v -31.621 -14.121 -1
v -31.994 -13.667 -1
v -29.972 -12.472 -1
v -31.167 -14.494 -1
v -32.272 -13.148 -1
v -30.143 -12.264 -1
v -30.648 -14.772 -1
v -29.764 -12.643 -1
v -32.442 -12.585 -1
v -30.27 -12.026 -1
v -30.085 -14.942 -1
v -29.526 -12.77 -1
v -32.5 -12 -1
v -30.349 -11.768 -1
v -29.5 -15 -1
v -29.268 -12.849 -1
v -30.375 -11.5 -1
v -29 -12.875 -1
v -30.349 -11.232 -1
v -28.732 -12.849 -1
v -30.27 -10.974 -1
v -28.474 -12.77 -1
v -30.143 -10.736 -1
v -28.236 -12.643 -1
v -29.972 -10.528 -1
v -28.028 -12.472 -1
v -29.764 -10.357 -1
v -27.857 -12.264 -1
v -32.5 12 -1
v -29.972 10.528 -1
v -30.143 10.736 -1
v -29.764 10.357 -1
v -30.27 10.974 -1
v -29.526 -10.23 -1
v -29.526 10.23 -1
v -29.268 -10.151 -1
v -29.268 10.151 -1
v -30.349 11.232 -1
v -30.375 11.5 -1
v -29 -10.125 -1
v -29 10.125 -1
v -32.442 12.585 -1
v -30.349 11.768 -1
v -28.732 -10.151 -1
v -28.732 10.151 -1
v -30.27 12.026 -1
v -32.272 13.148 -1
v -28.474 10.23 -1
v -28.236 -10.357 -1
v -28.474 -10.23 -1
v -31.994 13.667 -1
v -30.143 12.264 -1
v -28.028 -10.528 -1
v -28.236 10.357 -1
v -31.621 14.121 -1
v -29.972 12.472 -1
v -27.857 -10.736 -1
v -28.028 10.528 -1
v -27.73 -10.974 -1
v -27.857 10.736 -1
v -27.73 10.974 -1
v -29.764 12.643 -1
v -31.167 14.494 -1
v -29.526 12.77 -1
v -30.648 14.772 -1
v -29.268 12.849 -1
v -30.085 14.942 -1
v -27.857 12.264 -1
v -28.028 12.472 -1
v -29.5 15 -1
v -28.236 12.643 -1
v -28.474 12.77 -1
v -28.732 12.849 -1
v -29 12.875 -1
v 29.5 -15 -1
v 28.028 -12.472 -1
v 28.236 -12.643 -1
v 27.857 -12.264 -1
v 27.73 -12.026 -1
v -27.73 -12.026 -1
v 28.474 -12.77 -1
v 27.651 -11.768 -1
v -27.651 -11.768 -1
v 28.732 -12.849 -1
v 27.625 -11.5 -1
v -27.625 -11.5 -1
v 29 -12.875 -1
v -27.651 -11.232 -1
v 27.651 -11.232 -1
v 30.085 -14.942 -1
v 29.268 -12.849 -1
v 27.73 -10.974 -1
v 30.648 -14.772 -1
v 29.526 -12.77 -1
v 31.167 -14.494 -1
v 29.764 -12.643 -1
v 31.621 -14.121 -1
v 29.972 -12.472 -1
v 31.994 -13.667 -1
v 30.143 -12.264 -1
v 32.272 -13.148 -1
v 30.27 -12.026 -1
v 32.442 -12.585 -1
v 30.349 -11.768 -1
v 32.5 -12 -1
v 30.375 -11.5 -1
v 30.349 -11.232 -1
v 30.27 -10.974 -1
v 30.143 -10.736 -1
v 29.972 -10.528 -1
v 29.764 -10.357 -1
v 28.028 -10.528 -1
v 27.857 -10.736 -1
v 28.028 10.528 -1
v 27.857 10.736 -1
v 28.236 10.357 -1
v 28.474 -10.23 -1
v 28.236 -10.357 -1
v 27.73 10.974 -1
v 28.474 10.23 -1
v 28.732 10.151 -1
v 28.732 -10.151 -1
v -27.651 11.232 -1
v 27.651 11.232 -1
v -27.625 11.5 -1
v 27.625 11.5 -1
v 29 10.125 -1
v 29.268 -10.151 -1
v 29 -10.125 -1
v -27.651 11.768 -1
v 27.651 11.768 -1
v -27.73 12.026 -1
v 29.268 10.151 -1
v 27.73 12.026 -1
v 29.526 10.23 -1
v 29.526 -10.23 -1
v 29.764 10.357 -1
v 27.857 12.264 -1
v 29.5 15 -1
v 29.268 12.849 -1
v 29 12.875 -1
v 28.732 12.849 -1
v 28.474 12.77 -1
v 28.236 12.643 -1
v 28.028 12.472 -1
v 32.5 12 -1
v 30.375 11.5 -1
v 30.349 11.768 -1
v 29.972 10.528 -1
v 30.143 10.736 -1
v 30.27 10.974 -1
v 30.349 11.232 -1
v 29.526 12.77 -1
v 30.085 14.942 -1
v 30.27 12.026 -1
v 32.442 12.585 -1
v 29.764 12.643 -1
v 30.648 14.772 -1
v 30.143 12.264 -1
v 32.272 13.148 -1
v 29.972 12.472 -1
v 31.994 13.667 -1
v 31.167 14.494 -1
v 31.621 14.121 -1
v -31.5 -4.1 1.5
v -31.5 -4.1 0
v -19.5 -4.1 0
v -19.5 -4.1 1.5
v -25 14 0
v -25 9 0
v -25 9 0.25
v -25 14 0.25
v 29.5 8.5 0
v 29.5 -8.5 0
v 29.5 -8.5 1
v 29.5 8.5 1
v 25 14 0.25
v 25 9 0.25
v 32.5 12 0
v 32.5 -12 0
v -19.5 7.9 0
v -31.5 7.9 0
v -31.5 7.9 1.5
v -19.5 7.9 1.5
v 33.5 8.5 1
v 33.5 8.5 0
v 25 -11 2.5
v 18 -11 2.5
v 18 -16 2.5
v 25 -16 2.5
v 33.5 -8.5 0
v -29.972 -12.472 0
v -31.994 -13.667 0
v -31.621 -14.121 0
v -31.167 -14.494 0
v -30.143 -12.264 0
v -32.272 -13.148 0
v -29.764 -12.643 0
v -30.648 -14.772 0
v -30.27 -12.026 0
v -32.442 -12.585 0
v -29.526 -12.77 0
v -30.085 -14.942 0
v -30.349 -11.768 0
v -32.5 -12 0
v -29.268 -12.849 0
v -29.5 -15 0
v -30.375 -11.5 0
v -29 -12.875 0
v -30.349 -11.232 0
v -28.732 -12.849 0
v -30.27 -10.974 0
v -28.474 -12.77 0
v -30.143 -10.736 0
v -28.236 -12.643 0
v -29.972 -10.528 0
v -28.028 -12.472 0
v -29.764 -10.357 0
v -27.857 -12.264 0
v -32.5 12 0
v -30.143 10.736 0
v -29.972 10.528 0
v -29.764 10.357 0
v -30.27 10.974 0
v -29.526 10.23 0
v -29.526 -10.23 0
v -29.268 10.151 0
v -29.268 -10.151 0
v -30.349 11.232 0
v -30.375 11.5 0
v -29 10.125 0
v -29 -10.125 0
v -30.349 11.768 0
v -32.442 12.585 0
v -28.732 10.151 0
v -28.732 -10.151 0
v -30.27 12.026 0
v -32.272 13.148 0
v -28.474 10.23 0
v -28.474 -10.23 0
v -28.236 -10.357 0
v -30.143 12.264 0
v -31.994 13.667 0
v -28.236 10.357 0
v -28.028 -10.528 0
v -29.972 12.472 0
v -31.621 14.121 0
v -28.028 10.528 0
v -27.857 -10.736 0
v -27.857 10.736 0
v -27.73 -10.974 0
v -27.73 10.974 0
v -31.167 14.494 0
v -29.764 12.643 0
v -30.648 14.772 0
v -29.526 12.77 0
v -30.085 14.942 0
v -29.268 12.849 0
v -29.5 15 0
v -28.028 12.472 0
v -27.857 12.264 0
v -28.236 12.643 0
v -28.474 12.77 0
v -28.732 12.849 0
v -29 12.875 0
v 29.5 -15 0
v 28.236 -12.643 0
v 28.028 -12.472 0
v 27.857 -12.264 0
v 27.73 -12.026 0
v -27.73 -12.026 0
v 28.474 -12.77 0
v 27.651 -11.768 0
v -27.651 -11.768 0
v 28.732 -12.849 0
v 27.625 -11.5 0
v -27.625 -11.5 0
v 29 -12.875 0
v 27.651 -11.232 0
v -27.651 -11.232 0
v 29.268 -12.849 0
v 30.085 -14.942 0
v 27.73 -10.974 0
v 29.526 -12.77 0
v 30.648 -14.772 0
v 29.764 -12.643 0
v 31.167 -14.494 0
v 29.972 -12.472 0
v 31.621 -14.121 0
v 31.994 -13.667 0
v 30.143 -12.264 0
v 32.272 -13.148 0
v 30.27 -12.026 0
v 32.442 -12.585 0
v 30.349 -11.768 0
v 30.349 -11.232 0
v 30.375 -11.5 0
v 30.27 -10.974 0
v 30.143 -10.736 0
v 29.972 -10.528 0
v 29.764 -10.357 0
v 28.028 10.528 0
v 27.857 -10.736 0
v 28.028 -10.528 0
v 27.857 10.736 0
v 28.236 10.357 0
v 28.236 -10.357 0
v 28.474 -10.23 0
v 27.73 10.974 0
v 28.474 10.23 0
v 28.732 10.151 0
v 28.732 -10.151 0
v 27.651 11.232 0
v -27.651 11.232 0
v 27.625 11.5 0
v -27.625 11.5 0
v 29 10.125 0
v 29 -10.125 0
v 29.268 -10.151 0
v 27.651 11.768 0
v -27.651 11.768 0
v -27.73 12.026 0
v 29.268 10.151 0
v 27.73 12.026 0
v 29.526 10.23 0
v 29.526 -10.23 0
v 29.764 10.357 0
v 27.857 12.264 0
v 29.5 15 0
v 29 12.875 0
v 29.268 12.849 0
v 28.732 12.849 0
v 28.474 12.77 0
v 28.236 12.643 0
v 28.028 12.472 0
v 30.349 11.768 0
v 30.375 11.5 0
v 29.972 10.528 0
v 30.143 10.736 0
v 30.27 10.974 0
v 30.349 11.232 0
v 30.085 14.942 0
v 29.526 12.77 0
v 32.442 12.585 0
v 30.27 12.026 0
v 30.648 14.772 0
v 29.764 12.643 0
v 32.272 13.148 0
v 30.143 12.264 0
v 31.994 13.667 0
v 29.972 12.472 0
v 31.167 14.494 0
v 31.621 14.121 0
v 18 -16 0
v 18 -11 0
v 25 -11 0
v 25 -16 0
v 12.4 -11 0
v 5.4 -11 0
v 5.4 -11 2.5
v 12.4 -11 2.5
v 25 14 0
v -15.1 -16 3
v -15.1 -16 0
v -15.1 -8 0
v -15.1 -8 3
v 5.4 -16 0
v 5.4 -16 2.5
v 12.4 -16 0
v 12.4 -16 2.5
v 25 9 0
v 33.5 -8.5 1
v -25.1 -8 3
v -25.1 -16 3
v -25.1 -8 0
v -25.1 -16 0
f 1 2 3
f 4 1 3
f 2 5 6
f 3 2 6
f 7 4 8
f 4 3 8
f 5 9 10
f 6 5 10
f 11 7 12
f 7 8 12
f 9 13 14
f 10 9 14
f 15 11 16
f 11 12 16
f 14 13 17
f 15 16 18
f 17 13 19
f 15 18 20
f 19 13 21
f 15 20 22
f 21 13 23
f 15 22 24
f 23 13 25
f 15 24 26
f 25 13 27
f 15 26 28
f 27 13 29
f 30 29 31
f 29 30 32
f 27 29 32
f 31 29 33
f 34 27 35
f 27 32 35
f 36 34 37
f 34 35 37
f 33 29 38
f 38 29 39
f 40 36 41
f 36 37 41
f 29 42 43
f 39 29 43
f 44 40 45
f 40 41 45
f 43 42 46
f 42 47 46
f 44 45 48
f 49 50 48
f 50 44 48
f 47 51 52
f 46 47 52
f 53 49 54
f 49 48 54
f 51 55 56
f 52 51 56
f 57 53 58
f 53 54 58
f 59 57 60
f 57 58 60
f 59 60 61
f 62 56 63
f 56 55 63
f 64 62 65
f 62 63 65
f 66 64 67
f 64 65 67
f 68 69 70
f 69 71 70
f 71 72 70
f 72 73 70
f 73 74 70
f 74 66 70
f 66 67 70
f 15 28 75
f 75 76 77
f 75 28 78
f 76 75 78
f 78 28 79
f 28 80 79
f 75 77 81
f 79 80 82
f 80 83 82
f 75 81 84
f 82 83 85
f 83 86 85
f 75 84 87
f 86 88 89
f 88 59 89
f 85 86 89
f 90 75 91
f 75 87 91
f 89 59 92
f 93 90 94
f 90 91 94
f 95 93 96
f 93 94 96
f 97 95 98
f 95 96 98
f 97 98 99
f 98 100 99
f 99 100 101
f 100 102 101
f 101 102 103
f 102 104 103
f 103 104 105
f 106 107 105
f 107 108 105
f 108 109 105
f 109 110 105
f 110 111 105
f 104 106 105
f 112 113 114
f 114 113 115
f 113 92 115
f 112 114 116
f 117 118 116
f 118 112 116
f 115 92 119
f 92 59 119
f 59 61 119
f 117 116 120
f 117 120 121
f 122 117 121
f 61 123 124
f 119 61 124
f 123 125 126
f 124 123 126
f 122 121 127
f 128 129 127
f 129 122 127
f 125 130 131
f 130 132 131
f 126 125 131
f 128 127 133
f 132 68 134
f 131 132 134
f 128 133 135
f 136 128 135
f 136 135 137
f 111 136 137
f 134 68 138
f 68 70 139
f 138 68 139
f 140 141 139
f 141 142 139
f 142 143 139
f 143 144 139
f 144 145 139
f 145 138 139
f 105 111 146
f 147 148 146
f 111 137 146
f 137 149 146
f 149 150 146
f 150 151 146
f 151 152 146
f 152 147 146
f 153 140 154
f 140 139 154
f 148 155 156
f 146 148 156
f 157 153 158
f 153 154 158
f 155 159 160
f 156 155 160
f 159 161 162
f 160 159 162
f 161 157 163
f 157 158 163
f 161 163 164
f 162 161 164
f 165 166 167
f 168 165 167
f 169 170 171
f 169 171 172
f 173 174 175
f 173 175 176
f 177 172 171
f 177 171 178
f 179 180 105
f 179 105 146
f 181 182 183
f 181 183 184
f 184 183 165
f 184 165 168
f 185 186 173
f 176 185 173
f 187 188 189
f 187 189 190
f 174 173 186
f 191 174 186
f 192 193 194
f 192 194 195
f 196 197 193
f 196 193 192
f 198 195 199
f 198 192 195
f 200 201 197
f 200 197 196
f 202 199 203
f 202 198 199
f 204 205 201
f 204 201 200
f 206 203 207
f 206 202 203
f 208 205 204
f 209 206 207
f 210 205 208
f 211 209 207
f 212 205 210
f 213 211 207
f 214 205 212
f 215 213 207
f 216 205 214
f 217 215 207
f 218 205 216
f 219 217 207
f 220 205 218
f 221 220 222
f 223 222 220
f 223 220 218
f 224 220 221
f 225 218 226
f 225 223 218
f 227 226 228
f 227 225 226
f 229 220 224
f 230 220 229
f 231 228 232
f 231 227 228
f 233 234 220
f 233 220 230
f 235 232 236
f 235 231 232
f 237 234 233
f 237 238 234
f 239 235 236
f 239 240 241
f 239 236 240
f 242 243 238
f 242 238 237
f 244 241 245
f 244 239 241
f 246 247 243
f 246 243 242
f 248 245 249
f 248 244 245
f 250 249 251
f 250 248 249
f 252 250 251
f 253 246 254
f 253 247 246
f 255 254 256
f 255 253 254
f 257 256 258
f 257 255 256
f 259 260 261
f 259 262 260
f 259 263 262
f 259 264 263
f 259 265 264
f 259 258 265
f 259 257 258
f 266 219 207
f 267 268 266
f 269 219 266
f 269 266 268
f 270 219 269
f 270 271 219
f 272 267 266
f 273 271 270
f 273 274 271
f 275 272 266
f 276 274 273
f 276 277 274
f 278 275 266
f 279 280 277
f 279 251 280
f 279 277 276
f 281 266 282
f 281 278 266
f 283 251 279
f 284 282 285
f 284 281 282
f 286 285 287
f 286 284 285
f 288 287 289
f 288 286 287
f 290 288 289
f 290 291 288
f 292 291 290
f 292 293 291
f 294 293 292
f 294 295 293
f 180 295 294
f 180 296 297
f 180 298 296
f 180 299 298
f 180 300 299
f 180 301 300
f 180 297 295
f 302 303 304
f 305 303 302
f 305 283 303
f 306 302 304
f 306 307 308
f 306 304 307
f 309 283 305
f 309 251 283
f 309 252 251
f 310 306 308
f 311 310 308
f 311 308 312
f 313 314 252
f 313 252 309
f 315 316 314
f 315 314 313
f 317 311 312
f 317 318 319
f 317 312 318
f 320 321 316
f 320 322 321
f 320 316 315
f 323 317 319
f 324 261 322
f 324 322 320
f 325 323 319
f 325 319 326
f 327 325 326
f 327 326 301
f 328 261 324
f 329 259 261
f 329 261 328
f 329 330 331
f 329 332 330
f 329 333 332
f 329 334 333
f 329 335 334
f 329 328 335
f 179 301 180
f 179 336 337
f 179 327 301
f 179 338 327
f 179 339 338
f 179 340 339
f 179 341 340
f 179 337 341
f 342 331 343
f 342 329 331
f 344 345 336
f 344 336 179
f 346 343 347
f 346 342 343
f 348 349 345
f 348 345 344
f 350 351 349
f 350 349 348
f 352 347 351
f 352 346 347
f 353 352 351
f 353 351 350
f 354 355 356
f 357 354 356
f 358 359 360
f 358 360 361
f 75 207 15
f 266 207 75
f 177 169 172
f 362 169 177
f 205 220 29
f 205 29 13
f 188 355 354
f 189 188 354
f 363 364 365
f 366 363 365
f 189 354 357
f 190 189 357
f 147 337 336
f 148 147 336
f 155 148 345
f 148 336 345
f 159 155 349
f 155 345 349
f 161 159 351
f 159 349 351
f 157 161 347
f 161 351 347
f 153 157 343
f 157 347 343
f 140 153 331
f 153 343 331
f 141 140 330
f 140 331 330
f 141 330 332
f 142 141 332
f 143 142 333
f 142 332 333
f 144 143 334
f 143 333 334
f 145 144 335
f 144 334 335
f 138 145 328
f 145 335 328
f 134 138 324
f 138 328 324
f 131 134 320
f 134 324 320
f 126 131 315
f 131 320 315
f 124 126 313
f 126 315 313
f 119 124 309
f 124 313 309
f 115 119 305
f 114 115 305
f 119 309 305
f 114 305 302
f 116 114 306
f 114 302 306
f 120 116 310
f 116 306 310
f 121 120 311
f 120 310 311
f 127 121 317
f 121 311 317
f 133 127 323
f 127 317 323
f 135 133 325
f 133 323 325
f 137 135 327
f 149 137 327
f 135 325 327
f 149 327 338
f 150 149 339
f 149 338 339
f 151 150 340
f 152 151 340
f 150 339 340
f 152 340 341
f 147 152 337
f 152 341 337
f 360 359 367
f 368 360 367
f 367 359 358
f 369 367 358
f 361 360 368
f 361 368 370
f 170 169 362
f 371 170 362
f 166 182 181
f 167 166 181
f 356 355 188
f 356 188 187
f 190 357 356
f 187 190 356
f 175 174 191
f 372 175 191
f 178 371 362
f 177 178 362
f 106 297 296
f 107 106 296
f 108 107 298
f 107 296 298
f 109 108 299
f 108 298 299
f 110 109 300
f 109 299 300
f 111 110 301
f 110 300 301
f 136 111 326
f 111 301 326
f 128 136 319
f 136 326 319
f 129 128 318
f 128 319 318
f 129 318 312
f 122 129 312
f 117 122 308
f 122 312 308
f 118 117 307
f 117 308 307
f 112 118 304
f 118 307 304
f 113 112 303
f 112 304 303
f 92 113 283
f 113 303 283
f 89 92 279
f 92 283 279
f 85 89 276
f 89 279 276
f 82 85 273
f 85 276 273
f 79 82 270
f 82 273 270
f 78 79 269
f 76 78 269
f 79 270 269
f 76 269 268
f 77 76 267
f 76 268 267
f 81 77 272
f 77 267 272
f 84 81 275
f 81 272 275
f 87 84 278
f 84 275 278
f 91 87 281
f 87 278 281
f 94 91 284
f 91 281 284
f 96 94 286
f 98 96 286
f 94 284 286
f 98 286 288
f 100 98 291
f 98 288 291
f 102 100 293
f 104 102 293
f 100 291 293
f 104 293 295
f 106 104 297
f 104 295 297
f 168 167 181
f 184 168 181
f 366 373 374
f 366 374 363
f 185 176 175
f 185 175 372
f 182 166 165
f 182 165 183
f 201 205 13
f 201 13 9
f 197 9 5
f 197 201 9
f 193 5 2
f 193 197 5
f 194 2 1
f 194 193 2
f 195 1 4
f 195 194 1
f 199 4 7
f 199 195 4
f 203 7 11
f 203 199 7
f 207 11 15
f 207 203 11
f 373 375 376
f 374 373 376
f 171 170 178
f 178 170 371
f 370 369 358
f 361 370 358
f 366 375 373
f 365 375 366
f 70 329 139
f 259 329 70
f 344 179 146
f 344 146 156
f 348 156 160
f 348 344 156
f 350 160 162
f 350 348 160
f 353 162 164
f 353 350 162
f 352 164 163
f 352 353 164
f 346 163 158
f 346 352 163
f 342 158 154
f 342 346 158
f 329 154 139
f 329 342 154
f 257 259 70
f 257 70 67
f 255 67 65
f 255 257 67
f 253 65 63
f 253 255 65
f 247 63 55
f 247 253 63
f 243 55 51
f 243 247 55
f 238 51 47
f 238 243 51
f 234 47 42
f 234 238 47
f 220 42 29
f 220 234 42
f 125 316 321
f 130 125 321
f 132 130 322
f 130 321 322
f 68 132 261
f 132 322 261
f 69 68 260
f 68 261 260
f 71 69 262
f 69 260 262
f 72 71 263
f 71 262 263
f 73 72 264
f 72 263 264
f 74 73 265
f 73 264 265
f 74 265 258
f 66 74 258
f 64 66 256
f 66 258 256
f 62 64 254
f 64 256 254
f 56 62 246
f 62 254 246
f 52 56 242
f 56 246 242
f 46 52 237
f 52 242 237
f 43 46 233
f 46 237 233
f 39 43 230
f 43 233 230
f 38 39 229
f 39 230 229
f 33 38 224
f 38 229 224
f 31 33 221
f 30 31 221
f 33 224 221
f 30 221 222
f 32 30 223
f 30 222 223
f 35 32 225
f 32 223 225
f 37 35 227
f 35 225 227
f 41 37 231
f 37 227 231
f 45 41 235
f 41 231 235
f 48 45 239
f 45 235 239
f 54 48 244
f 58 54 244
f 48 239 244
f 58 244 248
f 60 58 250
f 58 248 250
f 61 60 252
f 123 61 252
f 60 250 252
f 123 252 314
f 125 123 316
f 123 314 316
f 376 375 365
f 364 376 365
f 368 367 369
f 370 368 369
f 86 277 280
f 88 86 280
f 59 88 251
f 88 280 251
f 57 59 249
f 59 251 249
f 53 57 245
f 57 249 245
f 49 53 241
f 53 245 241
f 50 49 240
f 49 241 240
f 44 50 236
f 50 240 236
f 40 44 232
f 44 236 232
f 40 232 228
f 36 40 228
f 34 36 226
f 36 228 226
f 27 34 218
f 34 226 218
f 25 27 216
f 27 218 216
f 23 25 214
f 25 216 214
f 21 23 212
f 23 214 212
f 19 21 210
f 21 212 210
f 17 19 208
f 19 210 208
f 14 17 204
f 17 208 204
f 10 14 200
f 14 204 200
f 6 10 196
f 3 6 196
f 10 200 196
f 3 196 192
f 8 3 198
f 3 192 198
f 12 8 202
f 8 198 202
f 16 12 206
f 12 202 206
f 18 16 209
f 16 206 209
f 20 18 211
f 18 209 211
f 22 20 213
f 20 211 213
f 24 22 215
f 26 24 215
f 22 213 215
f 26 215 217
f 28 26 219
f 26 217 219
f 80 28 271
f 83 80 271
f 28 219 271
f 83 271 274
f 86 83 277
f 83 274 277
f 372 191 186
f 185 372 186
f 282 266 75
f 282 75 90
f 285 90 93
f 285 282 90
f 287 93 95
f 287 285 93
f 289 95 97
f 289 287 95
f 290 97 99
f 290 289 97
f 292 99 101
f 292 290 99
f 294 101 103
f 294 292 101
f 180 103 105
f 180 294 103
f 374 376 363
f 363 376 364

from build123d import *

# Parameters (mm, degrees)
F0_R     = 1.375
F0_W     = 12
F0_H     = 12
F0_W_2   = 50
F0_H_2   = 5
F0_W_3   = 10
F0_H_3   = 7
F0_W_4   = 3
F0_H_4   = 17
F0_W_5   = 7
F0_H_5   = 4
F1_DEPTH = 1
F2_DEPTH = 1.5
F0_H_6   = 1
F3_DEPTH = 3
F4_DEPTH = 2.5
F0_W_6   = 1
F5_DEPTH = 1
F6_DEPTH = 0.25


with BuildPart() as f1:
    # F0 (on Top) → F1 (new body)
    with BuildSketch(Plane.XY):
        with BuildLine():
            Line((25, -15), (29.5, -15))
            ThreePointArc((29.5, -15), (31.6213203436, -14.1213203436), (32.5, -12))
            Line((32.5, -12), (32.5, -8.5))
            Line((32.5, -8.5), (29.5, -8.5))
            Line((29.5, -8.5), (29.5, 8.5))
            Line((29.5, 8.5), (32.5, 8.5))
            Line((32.5, 8.5), (32.5, 12))
            ThreePointArc((32.5, 12), (31.6213203436, 14.1213203436), (29.5, 15))
            Line((29.5, 15), (-29.5, 15))
            ThreePointArc((-29.5, 15), (-31.6213203436, 14.1213203436), (-32.5, 12))
            Line((-32.5, 12), (-32.5, -12))
            ThreePointArc((-32.5, -12), (-31.6213203436, -14.1213203436), (-29.5, -15))
            Line((-29.5, -15), (-25.1, -15))
            Line((-25.1, -15), (-25.1, -8))
            Line((-25.1, -8), (-15.1, -8))
            Line((-15.1, -8), (-15.1, -15))
            Line((-15.1, -15), (5.4, -15))
            Line((5.4, -15), (5.4, -11))
            Line((5.4, -11), (12.4, -11))
            Line((12.4, -11), (12.4, -15))
            Line((12.4, -15), (18, -15))
            Line((18, -15), (18, -11))
            Line((18, -11), (25, -11))
            Line((25, -11), (25, -15))
        make_face()
        with Locations((-29, -11.5)):
            Circle(F0_R, mode=Mode.SUBTRACT)
        with Locations((29, -11.5)):
            Circle(F0_R, mode=Mode.SUBTRACT)
        with Locations((-25.5, 1.9)):
            Rectangle(F0_W, F0_H, mode=Mode.SUBTRACT)
        with Locations((-29, 11.5)):
            Circle(F0_R, mode=Mode.SUBTRACT)
        with Locations((0, 11.5)):
            Rectangle(F0_W_2, F0_H_2, mode=Mode.SUBTRACT)
        with Locations((29, 11.5)):
            Circle(F0_R, mode=Mode.SUBTRACT)
        with Locations((0, 11.5)):
            Rectangle(F0_W_2, F0_H_2)
        with Locations((-25.5, 1.9)):
            Rectangle(F0_W, F0_H)
        with Locations((-20.1, -11.5)):
            Rectangle(F0_W_3, F0_H_3)
        with Locations((31, 0)):
            Rectangle(F0_W_4, F0_H_4)
        with Locations((8.9, -13)):
            Rectangle(F0_W_5, F0_H_5)
        with Locations((21.5, -13)):
            Rectangle(F0_W_5, F0_H_5)
    extrude(amount=-F1_DEPTH)


with BuildPart() as f2:
    # F0 (on Top) → F2 (new body)
    with BuildSketch(Plane.XY):
        with Locations((-25.5, 1.9)):
            Rectangle(F0_W, F0_H)
    extrude(amount=F2_DEPTH)


with BuildPart() as f3:
    # F0 (on Top) → F3 (new body)
    with BuildSketch(Plane.XY):
        with Locations((-20.1, -11.5)):
            Rectangle(F0_W_3, F0_H_3)
        with Locations((-20.1, -15.5)):
            Rectangle(F0_W_3, F0_H_6)
    extrude(amount=F3_DEPTH)


with BuildPart() as f4:
    # F0 (on Top) → F4 (new body)
    with BuildSketch(Plane.XY):
        with Locations((8.9, -13)):
            Rectangle(F0_W_5, F0_H_5)
        with Locations((8.9, -15.5)):
            Rectangle(F0_W_5, F0_H_6)
    extrude(amount=F4_DEPTH)


with BuildPart() as f4b:
    # F0 (on Top) → F4, piece 2 (new body)
    with BuildSketch(Plane.XY):
        with Locations((21.5, -13)):
            Rectangle(F0_W_5, F0_H_5)
        with Locations((21.5, -15.5)):
            Rectangle(F0_W_5, F0_H_6)
    extrude(amount=F4_DEPTH)


with BuildPart() as f5:
    # F0 (on Top) → F5 (new body)
    with BuildSketch(Plane.XY):
        with Locations((33, 0)):
            Rectangle(F0_W_6, F0_H_4)
        with Locations((31, 0)):
            Rectangle(F0_W_4, F0_H_4)
    extrude(amount=F5_DEPTH)


with BuildPart() as f6:
    # F0 (on Top) → F6 (new body)
    with BuildSketch(Plane.XY):
        with Locations((0, 11.5)):
            Rectangle(F0_W_2, F0_H_2)
    extrude(amount=F6_DEPTH)


solid = Compound([f1.part, f2.part, f3.part, f4.part, f4b.part, f5.part, f6.part])
